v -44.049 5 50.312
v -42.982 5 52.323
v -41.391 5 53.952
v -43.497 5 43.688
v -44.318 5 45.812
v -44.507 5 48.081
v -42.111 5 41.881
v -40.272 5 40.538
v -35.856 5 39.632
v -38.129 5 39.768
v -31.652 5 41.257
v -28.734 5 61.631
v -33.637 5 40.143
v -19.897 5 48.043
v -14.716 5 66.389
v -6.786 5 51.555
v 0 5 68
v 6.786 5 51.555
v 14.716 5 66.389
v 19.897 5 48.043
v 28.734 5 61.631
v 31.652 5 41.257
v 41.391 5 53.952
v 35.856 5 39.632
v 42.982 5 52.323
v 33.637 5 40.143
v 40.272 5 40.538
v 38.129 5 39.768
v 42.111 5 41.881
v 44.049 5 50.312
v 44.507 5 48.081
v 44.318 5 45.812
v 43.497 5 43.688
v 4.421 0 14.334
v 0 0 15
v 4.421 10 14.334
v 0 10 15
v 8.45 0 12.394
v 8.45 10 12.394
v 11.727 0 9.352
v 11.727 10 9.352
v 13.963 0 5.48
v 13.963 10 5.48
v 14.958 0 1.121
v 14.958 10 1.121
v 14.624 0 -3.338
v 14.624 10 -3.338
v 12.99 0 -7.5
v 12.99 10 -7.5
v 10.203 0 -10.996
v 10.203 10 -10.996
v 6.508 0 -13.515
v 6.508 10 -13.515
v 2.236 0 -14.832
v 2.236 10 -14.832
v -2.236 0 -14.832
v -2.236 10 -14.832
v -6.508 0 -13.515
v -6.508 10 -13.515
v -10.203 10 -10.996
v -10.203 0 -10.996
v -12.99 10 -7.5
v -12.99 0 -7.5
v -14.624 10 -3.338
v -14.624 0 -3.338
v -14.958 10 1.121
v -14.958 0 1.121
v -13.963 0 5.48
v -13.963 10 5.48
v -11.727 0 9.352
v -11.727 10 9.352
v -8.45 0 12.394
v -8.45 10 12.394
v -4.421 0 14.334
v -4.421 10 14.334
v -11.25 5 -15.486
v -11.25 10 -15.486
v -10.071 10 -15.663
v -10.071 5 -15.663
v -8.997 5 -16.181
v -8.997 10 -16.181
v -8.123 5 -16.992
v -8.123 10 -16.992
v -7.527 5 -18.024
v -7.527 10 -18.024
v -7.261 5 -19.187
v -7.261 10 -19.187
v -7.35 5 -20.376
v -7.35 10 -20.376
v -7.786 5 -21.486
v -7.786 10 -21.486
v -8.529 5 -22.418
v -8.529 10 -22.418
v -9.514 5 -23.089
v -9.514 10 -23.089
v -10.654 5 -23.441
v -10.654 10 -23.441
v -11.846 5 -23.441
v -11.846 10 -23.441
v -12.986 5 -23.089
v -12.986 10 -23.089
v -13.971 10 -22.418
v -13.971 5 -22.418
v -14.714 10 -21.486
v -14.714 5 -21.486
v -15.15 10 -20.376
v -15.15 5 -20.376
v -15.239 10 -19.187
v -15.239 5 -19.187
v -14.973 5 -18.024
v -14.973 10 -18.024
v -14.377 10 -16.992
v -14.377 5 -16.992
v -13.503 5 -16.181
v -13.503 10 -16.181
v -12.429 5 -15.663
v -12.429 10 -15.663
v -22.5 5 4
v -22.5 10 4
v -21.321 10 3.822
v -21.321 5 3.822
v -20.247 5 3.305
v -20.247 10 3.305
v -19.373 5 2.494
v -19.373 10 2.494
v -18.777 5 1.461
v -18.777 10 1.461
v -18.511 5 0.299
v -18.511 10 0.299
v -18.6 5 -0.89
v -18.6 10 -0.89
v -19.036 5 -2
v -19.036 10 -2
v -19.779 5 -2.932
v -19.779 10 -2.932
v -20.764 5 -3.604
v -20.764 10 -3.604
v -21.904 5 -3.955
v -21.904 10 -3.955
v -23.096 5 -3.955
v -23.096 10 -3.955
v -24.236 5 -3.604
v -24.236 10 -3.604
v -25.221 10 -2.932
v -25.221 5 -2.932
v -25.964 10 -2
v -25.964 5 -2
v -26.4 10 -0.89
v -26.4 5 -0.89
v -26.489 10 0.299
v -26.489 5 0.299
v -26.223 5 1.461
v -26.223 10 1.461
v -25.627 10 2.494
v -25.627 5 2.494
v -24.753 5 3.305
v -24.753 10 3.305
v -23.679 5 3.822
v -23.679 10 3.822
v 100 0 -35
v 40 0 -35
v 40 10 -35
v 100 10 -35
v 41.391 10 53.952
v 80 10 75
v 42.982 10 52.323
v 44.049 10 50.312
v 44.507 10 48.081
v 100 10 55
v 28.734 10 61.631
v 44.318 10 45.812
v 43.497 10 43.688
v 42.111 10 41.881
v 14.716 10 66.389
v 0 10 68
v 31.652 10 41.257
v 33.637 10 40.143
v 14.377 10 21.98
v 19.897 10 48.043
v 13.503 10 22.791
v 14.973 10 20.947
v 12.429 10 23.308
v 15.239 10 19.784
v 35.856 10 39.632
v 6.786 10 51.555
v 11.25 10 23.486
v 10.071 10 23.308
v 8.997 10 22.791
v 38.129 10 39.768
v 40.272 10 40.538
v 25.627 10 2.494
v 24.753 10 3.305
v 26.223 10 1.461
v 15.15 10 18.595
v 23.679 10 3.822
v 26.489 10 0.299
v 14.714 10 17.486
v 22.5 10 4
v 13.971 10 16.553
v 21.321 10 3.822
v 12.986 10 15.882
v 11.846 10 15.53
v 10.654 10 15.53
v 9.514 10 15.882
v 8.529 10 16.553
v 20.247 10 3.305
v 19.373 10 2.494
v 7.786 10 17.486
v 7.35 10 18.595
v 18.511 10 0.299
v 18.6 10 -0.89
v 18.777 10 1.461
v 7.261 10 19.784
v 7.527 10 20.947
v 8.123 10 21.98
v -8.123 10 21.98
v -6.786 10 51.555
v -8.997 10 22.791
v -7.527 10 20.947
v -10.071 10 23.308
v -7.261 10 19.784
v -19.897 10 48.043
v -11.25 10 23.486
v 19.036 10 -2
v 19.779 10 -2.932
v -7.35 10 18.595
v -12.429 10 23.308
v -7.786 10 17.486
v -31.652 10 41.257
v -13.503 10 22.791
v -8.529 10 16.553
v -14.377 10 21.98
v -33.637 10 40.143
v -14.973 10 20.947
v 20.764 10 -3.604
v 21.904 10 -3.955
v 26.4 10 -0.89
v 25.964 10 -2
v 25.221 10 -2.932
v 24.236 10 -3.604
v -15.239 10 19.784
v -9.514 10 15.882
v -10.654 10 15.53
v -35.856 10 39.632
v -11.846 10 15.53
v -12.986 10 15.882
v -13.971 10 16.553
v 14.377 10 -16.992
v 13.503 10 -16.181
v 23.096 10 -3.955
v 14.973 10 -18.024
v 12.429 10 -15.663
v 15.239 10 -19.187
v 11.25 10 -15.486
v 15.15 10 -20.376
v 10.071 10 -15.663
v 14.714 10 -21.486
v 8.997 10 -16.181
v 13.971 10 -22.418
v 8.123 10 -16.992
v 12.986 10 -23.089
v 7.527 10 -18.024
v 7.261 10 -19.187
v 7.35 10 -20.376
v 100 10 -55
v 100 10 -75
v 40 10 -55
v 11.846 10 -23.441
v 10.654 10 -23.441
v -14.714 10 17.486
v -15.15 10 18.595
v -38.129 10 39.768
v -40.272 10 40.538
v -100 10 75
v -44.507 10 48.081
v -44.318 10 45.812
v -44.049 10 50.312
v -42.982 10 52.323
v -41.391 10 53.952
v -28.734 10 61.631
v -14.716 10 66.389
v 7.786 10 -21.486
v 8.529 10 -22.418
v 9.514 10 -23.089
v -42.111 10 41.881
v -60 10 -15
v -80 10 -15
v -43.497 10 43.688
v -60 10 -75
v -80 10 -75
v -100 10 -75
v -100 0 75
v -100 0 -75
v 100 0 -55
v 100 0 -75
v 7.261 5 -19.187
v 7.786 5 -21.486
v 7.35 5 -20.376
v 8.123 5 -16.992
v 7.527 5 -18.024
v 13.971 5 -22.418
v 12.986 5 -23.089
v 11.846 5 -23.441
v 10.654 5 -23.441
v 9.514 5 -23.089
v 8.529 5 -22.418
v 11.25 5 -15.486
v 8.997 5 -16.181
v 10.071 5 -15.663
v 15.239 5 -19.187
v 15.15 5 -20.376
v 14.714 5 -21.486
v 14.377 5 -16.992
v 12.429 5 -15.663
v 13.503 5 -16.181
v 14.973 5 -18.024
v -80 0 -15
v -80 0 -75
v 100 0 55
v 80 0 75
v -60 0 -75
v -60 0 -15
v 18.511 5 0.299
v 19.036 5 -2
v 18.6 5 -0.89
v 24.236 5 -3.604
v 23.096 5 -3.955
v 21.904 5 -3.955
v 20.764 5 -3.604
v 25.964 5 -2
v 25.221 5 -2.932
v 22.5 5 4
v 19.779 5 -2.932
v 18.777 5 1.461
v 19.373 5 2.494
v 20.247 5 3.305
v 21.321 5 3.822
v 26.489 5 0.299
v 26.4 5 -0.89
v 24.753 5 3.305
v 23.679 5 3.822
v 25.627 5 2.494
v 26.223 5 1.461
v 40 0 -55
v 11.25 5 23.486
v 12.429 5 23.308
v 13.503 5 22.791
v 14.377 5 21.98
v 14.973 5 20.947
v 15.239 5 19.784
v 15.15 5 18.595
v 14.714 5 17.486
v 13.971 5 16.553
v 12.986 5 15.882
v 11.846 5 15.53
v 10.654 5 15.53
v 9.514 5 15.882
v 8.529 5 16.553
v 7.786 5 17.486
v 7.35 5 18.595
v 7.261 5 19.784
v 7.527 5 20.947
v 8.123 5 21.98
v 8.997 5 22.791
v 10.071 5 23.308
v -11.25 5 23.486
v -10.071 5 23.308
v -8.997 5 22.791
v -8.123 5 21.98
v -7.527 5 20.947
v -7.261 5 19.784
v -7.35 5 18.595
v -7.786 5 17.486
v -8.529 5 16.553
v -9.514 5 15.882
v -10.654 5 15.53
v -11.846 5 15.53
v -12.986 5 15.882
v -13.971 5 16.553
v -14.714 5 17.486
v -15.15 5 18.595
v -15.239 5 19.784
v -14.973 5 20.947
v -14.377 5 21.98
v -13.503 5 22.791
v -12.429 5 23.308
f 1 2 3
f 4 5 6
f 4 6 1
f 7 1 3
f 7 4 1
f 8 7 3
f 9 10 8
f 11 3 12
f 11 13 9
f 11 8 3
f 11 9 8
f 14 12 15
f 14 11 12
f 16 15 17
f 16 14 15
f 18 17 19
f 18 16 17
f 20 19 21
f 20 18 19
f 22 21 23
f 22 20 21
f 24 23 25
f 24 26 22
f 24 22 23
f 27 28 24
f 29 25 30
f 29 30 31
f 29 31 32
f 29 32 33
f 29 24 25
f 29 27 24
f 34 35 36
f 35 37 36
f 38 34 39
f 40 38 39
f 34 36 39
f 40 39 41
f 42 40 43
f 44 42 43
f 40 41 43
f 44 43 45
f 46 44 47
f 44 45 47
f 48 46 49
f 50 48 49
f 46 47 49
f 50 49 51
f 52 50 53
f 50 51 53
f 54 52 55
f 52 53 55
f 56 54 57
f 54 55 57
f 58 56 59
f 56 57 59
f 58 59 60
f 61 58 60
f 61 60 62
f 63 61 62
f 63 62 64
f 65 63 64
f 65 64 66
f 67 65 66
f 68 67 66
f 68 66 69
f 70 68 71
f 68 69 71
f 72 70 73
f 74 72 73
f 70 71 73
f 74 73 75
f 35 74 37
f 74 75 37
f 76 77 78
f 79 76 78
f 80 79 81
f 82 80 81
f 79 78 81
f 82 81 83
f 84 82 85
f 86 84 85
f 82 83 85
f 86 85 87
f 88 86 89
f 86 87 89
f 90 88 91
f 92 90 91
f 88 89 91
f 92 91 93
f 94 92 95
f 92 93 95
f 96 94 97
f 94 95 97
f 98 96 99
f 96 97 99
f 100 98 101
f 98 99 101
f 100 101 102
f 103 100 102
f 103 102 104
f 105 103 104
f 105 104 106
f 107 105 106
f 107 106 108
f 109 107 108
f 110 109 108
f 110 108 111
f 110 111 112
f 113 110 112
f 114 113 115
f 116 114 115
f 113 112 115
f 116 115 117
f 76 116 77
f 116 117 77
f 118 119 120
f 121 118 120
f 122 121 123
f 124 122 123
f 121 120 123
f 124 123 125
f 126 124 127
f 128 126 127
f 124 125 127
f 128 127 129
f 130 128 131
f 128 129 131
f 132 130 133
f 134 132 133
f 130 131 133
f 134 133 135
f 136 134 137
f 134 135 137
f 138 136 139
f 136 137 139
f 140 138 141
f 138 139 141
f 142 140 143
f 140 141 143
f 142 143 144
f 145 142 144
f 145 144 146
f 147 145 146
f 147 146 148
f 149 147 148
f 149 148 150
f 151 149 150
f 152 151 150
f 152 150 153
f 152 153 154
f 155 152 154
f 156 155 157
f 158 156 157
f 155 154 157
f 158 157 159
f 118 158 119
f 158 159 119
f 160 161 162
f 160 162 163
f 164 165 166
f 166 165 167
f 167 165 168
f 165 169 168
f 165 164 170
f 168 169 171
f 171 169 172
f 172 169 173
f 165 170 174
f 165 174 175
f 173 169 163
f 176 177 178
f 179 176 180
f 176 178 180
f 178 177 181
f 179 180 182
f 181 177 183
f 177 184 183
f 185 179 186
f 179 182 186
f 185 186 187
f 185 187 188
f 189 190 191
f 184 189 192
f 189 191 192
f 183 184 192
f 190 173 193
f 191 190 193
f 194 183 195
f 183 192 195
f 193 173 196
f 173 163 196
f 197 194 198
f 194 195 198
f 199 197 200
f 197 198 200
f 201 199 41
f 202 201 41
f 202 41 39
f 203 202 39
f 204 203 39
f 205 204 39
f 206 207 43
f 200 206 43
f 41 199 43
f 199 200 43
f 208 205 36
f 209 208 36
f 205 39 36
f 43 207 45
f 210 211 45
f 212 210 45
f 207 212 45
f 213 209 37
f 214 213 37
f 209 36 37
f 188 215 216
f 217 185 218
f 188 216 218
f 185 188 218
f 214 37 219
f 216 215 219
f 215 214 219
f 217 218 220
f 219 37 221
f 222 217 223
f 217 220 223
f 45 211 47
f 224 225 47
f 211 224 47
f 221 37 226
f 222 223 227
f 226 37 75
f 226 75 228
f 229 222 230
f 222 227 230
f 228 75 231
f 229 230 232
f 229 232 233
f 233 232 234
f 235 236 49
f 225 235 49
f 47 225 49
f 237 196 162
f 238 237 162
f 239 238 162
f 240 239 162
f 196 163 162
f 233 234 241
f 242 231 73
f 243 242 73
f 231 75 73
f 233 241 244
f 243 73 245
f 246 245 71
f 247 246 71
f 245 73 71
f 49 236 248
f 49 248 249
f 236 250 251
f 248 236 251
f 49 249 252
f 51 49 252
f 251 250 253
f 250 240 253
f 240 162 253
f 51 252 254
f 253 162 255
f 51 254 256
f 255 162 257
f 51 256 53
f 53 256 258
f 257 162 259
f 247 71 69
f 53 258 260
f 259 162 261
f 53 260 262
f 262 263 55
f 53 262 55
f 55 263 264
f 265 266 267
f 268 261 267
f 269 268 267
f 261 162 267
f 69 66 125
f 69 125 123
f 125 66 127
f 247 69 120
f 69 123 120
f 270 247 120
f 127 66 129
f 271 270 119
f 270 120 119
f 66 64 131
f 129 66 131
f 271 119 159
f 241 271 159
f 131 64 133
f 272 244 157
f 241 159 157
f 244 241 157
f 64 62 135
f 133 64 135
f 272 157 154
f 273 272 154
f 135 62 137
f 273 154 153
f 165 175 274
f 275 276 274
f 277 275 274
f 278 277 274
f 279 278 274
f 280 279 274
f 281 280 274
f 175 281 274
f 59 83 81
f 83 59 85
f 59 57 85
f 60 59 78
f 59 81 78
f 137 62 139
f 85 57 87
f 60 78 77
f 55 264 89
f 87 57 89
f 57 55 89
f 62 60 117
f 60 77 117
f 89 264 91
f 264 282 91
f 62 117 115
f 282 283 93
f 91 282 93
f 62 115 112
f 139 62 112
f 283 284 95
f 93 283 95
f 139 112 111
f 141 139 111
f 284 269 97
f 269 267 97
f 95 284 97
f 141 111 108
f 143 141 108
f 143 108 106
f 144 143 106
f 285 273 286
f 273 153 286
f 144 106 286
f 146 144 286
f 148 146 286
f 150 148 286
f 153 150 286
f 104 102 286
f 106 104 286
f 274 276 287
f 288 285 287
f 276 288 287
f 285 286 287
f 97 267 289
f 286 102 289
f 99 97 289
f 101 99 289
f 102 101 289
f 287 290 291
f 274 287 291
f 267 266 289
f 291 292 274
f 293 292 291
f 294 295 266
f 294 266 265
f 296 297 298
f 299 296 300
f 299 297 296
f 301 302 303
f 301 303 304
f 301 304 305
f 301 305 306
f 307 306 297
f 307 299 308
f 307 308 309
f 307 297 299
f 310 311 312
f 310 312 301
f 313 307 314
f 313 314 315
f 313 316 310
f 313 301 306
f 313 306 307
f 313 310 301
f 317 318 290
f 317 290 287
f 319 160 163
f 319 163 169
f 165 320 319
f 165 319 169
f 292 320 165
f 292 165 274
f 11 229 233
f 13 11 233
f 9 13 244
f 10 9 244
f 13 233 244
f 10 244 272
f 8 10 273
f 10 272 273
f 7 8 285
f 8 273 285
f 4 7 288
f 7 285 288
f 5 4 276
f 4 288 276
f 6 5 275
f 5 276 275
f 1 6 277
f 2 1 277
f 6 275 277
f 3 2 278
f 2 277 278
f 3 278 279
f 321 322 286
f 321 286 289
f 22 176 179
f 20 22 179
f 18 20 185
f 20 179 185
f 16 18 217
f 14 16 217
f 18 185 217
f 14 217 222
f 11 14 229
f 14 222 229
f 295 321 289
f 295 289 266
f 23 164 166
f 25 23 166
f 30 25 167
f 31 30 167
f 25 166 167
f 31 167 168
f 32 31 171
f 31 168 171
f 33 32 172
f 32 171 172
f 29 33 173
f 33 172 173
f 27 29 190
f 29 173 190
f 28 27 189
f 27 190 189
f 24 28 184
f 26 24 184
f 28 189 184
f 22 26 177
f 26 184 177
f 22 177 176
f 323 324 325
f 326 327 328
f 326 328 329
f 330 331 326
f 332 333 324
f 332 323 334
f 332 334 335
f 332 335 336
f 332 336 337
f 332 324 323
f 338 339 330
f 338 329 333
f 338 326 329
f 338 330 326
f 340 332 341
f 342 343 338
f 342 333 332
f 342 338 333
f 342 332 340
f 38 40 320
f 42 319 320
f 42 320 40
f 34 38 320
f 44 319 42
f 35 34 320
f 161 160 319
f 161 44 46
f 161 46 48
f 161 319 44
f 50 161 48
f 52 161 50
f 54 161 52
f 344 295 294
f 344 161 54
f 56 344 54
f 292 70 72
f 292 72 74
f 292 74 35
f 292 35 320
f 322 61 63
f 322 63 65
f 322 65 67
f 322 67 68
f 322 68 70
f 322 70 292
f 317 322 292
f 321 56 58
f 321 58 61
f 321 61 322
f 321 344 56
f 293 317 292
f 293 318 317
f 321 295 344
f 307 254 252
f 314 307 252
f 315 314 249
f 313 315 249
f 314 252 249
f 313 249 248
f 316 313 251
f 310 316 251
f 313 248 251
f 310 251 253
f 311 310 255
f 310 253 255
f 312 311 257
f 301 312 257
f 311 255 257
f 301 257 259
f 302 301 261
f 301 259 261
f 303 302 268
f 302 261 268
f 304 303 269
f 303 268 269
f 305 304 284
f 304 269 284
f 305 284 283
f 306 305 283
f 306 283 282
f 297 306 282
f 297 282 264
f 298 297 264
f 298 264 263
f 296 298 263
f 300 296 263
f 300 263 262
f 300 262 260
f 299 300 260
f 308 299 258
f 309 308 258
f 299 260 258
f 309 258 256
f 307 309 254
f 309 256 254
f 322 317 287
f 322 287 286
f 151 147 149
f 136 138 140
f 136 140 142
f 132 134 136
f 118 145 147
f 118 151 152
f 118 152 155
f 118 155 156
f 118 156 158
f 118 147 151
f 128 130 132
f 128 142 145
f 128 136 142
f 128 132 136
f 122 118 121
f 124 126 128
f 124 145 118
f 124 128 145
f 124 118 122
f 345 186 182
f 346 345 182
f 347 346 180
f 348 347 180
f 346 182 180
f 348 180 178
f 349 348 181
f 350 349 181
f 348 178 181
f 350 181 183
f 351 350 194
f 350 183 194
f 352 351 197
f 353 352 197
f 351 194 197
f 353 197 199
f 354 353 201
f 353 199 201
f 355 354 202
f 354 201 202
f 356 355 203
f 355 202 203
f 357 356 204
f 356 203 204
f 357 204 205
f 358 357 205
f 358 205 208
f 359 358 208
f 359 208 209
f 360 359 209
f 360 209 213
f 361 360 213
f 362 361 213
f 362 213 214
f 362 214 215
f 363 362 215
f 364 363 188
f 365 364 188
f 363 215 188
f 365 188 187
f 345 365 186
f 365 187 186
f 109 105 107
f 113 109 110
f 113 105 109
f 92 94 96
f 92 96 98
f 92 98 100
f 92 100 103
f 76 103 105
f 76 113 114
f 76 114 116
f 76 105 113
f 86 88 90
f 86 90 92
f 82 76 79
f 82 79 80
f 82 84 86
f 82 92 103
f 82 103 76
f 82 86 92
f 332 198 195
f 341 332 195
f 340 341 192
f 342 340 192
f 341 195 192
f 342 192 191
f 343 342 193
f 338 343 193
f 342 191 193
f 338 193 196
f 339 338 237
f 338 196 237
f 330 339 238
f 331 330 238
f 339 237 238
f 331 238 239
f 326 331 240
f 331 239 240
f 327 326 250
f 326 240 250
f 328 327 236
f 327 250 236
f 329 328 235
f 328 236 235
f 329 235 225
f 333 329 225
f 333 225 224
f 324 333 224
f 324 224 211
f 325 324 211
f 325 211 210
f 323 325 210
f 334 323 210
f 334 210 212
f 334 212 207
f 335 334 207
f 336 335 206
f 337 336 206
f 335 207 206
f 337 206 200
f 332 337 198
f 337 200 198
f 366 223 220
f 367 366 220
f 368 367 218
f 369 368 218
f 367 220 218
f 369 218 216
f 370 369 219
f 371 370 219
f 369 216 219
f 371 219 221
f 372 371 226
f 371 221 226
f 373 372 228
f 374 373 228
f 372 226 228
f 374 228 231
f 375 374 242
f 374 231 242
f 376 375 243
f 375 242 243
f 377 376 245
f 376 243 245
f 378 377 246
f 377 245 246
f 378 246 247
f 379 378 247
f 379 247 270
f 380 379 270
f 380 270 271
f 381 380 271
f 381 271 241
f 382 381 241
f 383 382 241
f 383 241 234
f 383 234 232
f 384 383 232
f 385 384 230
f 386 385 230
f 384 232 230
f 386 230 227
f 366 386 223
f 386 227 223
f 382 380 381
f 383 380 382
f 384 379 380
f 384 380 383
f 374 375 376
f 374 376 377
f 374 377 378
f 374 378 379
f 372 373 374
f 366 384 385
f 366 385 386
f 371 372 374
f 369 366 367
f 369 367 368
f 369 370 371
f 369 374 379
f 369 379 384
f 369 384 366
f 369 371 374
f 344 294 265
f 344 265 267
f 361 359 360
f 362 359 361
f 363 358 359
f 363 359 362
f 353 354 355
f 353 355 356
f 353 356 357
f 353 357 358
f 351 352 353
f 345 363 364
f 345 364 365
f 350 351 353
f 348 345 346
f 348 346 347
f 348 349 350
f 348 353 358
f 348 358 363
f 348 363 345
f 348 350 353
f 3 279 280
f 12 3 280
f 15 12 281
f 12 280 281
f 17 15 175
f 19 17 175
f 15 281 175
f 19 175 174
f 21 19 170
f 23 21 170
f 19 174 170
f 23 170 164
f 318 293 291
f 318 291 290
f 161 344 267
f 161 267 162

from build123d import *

# Parameters (mm, degrees)
BOSS_EXTRUDE1_DEPTH = 10
SKETCH2_R           = 15
CUT_EXTRUDE1_DEPTH  = 126.39936204
SKETCH2_3_R         = 15
SKETCH2_3_R_2       = 4
CUT_EXTRUDE2_DEPTH  = 5
CHAMFER1_SIZE       = 20


with BuildPart() as part:
    # Sketch1 → Boss-Extrude1 (new body)
    with BuildSketch(Plane(origin=(0, 0, 0), x_dir=(1, 0, 0), z_dir=(0, 1, 0))):
        Polygon((-80, 75), (-80, 15), (-60, 15), (-60, 75), (100, 75), (100, 55), (40, 55), (40, 35), (100, 35), (100, -75), (-100, -75), (-100, 75), align=None)
    extrude(amount=BOSS_EXTRUDE1_DEPTH)

    # Sketch2 → Cut-Extrude1 (cut, through all)
    with BuildSketch(Plane(origin=(0, 10, 0), x_dir=(1, 0, 0), z_dir=(0, 1, 0))):
        Circle(SKETCH2_R)
    extrude(amount=-CUT_EXTRUDE1_DEPTH, mode=Mode.SUBTRACT)

    # Sketch2<3> → Cut-Extrude2 (cut)
    with BuildSketch(Plane(origin=(0, 10, 0), x_dir=(1, 0, 0), z_dir=(0, 1, 0))):
        Circle(SKETCH2_3_R)
        with Locations((22.5, 0)):
            Circle(SKETCH2_3_R_2)
        with Locations((11.25, -19.485571585)):
            Circle(SKETCH2_3_R_2)
        with Locations((-11.25, -19.485571585)):
            Circle(SKETCH2_3_R_2)
        with Locations((-22.5, 0)):
            Circle(SKETCH2_3_R_2)
        with Locations((-11.25, 19.485571585)):
            Circle(SKETCH2_3_R_2)
        with Locations((11.25, 19.485571585)):
            Circle(SKETCH2_3_R_2)
        with BuildLine():
            ThreePointArc((-41.390750416, -53.951883934), (0, -68), (41.390750416, -53.951883934))
            ThreePointArc((41.390750416, -53.951883934), (42.86853083, -42.735103422), (31.651750318, -41.257323008))
            ThreePointArc((31.651750318, -41.257323008), (0, -52), (-31.651750318, -41.257323008))
            ThreePointArc((-31.651750318, -41.257323008), (-42.86853083, -42.735103422), (-41.390750416, -53.951883934))
        make_face()
    extrude(amount=-CUT_EXTRUDE2_DEPTH, mode=Mode.SUBTRACT)

    # Chamfer1
    chamfer1_edges = [part.edges().sort_by_distance(p)[0] for p in [
        (100, 5, 75),
    ]]
    chamfer(chamfer1_edges, length=CHAMFER1_SIZE)


solid = part.part
